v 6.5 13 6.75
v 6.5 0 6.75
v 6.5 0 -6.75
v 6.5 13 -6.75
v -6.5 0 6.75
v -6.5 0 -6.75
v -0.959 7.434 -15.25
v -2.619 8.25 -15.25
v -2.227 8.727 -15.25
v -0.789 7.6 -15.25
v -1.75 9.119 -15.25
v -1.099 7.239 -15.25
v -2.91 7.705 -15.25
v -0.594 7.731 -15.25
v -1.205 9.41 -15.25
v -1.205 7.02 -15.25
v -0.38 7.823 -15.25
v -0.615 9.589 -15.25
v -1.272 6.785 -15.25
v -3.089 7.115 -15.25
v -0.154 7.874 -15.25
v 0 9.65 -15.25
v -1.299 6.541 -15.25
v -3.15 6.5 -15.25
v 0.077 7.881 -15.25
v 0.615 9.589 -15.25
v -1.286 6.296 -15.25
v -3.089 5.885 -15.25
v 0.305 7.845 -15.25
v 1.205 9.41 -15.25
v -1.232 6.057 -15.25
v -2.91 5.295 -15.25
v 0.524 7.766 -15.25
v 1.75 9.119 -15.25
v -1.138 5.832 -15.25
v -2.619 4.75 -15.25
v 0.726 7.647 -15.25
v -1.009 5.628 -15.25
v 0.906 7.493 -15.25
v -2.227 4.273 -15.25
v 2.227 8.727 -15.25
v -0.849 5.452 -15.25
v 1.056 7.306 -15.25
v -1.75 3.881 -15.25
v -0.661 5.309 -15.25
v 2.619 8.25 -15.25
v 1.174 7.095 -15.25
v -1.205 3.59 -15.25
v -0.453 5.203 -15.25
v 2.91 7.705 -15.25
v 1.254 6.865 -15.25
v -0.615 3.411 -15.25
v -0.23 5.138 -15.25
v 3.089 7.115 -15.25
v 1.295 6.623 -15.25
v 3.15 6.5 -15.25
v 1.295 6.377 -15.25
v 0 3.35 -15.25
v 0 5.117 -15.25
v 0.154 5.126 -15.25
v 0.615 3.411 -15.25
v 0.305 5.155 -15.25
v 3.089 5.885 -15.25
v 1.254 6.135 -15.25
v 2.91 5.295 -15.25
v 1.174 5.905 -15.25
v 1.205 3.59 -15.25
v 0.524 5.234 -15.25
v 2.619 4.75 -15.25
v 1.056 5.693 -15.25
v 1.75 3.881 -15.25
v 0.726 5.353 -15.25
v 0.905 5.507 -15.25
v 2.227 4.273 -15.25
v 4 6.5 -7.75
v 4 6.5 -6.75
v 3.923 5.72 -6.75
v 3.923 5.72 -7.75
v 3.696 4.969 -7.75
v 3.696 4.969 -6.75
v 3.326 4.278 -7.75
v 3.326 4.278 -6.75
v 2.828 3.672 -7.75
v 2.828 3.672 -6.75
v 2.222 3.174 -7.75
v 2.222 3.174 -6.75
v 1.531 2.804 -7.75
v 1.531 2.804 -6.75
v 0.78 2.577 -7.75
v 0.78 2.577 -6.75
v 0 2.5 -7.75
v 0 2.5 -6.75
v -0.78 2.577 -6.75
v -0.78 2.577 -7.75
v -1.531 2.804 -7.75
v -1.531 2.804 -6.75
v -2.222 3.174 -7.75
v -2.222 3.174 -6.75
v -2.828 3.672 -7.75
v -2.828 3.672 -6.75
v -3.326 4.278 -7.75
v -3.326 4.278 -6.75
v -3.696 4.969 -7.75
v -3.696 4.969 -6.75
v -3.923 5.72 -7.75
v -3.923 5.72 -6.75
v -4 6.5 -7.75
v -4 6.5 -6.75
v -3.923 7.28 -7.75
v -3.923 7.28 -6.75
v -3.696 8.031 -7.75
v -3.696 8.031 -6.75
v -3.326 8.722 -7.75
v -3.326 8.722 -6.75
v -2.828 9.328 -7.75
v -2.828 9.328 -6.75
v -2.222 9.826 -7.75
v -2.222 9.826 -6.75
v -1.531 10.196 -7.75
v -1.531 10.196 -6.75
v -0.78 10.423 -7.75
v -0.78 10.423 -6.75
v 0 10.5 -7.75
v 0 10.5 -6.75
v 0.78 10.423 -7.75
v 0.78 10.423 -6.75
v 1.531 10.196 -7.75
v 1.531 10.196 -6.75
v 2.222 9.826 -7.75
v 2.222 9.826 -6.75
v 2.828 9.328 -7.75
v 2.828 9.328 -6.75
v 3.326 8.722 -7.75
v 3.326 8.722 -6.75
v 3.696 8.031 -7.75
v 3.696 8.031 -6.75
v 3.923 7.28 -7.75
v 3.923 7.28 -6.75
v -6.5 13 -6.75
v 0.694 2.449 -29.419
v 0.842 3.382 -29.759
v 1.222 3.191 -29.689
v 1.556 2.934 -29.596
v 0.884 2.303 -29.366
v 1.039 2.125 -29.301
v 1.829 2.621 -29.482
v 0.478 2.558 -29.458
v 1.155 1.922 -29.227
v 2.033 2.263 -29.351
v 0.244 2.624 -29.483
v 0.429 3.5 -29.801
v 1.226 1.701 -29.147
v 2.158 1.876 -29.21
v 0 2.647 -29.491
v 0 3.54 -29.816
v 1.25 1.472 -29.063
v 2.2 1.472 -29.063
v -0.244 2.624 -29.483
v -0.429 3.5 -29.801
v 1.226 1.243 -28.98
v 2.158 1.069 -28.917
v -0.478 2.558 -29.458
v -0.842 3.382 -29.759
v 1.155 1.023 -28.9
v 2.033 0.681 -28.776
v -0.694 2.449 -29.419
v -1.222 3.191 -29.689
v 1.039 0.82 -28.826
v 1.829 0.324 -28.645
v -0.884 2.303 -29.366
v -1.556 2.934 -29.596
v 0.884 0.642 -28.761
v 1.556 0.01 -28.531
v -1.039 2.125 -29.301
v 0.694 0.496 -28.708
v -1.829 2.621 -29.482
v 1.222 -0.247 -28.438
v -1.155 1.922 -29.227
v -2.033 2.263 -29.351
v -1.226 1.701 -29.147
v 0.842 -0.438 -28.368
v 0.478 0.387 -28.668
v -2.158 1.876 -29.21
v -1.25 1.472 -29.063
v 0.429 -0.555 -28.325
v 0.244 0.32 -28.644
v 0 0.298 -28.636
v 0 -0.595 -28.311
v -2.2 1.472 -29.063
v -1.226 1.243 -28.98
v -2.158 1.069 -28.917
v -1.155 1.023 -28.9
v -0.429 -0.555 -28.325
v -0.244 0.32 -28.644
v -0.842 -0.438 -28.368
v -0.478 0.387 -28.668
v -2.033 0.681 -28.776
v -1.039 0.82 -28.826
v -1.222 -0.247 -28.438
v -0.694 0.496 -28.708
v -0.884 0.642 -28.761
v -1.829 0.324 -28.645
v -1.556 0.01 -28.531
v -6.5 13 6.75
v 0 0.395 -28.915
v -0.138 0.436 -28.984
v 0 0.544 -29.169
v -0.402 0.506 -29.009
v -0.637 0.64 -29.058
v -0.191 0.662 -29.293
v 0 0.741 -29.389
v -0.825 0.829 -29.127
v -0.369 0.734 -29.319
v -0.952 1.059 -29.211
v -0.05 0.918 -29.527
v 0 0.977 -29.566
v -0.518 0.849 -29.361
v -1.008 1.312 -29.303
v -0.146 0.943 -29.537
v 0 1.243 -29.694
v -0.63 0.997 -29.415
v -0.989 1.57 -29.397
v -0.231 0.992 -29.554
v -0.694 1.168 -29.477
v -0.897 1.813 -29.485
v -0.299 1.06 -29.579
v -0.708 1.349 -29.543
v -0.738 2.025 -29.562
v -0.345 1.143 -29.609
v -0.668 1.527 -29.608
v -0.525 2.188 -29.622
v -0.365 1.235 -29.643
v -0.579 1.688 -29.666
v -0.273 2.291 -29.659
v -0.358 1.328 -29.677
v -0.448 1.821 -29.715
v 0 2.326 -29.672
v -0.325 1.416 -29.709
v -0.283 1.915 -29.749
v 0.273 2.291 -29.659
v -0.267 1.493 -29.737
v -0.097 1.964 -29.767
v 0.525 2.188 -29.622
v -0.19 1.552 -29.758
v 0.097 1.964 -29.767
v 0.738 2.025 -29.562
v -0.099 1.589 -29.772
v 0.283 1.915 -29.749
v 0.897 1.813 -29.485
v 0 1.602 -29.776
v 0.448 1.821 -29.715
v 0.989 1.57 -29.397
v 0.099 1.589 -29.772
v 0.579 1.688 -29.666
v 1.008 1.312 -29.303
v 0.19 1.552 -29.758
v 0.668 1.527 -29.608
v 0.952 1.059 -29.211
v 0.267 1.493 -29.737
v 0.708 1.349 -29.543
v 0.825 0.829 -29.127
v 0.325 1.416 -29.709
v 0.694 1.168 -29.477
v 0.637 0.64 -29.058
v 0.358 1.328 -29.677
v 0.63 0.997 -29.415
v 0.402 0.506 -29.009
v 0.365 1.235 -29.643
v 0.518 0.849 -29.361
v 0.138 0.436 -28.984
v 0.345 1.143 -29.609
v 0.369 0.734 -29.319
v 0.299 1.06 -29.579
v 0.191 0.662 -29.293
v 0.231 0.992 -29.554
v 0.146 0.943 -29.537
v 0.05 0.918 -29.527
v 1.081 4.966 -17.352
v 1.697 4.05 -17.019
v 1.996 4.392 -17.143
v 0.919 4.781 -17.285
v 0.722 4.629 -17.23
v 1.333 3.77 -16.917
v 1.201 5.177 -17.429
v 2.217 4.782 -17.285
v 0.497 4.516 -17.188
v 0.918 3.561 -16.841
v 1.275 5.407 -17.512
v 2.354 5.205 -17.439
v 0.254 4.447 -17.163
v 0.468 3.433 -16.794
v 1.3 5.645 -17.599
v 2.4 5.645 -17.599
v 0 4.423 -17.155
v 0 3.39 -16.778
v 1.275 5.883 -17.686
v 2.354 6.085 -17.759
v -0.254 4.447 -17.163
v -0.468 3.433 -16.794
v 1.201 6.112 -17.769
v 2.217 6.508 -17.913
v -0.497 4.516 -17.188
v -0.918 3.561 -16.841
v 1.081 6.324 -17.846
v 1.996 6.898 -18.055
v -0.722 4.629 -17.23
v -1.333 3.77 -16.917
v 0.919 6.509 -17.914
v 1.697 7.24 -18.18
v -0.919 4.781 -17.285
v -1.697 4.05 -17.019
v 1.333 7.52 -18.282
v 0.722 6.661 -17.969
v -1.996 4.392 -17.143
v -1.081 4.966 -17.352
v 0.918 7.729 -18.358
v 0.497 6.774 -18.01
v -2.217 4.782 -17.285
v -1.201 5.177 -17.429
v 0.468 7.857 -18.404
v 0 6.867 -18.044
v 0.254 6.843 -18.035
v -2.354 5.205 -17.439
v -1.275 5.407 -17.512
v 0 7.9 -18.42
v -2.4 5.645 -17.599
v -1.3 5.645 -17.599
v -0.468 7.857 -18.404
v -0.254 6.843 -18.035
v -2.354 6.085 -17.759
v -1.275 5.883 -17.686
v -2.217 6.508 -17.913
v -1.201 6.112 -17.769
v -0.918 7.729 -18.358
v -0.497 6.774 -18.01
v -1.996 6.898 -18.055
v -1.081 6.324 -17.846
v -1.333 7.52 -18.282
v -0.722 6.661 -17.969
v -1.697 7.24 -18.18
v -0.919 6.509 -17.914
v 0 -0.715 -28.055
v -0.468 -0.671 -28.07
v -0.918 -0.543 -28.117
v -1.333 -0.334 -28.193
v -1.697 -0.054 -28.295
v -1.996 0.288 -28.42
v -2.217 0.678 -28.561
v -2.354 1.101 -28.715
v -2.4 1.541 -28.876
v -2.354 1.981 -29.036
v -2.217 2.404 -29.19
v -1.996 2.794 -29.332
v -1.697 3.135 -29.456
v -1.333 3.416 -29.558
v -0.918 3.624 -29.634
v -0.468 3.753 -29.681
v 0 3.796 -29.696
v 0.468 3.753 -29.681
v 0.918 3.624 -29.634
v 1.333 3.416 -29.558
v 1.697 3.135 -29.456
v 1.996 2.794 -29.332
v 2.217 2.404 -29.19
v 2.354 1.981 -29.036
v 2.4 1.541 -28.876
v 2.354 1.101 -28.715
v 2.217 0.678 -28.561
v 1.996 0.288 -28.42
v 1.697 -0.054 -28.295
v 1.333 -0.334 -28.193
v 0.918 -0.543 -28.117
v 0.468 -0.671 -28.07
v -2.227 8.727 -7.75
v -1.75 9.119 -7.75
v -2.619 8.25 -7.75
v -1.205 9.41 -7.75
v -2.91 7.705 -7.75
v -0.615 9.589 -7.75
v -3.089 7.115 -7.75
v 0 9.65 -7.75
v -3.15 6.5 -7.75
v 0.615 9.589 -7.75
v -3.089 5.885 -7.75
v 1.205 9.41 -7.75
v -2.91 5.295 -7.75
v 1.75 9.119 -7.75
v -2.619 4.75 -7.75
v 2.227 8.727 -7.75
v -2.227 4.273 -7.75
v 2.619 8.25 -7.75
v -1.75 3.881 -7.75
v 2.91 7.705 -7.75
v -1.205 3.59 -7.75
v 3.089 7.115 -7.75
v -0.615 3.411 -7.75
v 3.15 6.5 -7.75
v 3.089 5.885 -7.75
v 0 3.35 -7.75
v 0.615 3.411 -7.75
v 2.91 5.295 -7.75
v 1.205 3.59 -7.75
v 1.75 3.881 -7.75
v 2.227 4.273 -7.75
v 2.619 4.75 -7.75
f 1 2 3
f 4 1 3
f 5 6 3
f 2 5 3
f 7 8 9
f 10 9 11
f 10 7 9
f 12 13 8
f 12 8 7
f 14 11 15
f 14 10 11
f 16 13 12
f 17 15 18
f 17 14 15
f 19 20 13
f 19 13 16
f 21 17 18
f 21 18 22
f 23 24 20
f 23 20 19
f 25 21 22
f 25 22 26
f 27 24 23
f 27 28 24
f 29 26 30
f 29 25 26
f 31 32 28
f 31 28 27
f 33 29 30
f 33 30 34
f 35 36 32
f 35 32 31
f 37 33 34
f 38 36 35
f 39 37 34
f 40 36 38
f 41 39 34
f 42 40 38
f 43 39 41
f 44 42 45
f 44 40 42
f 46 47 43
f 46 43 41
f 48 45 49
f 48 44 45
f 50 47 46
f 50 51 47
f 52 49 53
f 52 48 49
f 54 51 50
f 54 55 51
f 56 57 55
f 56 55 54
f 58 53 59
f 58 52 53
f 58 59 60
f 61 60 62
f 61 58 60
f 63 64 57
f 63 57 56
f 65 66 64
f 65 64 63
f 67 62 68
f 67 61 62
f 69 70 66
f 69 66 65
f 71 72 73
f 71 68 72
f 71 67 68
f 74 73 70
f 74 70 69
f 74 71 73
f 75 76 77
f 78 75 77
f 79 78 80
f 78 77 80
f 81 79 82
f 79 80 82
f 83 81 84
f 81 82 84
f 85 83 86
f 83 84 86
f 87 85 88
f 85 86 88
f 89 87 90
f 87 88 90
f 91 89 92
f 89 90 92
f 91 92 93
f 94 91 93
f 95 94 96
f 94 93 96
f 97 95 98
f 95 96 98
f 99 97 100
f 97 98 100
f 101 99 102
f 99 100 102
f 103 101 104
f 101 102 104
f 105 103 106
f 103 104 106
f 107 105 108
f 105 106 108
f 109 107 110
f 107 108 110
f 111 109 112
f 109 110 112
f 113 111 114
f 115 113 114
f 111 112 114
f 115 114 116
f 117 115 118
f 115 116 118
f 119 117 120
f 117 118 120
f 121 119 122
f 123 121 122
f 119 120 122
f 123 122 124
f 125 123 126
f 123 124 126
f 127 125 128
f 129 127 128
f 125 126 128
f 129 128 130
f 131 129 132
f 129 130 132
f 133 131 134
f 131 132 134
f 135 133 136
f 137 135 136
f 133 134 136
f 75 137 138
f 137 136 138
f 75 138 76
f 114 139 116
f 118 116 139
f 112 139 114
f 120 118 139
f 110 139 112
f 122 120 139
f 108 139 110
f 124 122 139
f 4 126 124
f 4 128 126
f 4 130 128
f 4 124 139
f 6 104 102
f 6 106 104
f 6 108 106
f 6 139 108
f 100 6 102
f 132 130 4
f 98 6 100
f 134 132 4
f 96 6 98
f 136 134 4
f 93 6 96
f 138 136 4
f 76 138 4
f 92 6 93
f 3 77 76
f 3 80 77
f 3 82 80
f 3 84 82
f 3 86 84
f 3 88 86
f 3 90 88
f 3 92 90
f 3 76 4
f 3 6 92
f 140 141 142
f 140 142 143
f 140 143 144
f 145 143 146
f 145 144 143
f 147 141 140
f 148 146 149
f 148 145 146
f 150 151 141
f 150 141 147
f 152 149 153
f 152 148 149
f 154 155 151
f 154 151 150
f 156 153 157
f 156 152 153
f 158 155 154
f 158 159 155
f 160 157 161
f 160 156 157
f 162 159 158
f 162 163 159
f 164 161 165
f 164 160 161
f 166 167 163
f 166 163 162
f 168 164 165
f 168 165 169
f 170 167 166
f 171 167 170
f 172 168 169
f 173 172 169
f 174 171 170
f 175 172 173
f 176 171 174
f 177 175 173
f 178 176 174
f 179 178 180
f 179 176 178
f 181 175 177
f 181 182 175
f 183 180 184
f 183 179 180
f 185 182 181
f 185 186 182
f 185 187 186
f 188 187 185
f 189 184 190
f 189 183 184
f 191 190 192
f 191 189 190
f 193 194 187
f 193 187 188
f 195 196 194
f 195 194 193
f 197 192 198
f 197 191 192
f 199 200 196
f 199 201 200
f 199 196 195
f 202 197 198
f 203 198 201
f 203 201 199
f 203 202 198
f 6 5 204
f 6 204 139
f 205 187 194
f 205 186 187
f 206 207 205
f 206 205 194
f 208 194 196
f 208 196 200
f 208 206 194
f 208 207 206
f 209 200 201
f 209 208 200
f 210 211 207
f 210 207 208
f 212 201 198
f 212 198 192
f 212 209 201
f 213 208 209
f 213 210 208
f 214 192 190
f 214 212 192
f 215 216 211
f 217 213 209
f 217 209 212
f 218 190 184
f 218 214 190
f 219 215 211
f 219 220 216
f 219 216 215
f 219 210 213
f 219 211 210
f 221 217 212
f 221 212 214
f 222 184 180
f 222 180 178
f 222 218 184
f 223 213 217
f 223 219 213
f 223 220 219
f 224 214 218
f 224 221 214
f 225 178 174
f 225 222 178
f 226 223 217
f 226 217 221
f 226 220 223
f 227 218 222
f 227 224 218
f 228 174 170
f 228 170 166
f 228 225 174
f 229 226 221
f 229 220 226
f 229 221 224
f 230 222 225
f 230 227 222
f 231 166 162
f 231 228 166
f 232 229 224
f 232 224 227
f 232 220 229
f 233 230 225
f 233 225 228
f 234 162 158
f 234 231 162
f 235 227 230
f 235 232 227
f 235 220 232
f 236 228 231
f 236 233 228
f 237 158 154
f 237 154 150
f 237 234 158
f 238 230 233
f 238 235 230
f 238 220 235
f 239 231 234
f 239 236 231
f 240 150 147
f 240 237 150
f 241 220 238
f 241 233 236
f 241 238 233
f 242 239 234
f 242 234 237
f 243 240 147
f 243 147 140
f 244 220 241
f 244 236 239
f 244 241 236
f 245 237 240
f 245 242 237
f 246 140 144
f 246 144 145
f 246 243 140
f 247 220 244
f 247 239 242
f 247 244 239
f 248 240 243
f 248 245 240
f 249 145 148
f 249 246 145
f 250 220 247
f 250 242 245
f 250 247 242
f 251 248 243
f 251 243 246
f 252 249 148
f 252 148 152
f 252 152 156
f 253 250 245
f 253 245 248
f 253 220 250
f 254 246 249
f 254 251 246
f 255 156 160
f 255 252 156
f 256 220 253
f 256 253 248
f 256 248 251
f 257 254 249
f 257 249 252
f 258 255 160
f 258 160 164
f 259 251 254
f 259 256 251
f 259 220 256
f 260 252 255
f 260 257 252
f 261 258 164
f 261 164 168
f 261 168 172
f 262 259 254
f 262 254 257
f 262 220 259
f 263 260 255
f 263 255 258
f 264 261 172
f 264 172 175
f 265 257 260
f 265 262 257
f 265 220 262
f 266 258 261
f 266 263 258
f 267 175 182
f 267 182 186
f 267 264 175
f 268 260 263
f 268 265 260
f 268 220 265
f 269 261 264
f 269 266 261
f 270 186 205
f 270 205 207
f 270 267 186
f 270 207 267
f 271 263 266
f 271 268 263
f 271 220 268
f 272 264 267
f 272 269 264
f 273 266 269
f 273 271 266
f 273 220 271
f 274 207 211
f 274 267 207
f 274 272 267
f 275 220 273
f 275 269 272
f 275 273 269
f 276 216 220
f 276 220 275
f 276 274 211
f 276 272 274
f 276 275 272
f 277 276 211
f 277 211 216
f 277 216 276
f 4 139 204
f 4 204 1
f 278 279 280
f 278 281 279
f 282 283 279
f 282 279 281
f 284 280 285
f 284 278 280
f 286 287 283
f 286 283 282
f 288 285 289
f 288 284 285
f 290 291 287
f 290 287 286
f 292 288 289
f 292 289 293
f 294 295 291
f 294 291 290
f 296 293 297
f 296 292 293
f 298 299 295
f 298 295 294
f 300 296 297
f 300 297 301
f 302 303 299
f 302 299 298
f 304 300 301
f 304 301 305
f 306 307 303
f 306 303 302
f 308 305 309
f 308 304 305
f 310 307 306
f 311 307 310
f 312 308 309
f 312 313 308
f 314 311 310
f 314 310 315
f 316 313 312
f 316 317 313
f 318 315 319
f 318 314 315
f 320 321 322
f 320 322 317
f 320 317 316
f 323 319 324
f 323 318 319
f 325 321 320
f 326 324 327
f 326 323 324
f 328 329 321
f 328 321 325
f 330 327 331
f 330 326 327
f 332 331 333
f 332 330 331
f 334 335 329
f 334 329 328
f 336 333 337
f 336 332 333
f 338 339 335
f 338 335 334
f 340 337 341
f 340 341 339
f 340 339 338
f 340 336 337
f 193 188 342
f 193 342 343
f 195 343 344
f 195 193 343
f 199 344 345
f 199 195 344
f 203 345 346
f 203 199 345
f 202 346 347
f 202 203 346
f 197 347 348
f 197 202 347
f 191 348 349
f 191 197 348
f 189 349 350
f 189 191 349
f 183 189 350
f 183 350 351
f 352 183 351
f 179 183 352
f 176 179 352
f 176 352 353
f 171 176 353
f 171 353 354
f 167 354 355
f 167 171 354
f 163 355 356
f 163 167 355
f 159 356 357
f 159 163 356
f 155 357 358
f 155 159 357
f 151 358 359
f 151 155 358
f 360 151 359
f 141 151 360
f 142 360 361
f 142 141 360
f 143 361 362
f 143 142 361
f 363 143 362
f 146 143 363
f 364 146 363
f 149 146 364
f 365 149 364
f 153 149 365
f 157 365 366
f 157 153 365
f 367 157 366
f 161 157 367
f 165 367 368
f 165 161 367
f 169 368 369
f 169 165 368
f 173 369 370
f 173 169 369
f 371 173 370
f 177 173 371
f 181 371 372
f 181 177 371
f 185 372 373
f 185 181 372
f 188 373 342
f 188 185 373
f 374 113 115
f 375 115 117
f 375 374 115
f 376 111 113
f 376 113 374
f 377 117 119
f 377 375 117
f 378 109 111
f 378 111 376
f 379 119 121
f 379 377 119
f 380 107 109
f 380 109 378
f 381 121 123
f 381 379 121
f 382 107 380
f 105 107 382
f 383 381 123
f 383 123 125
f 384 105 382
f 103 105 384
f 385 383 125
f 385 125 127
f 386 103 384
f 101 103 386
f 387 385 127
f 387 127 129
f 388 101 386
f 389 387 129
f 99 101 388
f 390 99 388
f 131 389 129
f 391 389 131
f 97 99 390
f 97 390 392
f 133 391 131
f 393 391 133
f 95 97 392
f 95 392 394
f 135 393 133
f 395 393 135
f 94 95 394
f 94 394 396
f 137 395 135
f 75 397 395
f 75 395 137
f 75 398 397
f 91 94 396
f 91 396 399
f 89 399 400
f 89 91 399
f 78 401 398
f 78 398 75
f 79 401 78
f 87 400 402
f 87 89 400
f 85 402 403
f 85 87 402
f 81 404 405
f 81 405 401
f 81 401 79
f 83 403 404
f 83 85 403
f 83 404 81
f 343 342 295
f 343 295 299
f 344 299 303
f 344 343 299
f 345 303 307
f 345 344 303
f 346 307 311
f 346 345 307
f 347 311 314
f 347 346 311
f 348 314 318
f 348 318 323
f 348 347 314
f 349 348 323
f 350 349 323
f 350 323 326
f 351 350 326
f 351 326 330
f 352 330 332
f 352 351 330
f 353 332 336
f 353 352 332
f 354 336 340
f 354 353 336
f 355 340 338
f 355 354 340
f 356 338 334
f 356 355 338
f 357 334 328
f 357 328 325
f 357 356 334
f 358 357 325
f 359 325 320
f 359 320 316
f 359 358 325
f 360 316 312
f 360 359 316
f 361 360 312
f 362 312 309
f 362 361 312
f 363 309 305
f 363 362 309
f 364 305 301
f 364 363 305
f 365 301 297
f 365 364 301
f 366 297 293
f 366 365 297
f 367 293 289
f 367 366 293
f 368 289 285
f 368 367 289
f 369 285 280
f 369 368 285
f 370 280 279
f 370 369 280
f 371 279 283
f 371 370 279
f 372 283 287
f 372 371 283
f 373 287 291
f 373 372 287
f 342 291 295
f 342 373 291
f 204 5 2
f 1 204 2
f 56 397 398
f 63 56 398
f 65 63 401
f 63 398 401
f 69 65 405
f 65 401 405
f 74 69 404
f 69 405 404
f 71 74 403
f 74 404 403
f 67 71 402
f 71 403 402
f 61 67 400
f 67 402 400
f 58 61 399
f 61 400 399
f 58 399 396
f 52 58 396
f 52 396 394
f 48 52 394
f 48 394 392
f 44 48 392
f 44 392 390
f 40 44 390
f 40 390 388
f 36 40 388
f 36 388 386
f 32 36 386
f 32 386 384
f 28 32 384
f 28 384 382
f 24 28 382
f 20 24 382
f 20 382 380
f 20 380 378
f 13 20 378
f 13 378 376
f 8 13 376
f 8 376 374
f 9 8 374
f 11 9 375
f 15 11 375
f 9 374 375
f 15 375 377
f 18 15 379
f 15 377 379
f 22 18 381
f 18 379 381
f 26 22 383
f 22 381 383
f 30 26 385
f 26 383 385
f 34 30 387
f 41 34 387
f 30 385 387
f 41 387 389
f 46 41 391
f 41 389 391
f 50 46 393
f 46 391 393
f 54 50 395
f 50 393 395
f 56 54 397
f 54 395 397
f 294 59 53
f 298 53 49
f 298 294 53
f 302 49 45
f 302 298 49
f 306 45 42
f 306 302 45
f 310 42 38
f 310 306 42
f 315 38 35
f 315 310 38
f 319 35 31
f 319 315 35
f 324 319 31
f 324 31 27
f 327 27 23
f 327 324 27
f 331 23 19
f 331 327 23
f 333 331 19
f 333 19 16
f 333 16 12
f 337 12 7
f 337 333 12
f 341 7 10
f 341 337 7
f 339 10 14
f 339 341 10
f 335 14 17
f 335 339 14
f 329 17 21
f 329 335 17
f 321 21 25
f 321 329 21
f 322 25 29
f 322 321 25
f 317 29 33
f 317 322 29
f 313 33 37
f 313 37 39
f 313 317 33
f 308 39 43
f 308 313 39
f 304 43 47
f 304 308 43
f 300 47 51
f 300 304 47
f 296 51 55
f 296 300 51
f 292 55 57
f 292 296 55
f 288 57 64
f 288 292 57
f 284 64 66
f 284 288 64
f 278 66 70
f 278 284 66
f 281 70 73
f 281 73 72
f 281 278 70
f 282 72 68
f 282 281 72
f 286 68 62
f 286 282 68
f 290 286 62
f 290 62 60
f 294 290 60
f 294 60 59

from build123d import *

# Parameters (mm, degrees)
SKETCH1_W           = 13
SKETCH1_H           = 13.5
BOSS_EXTRUDE1_DEPTH = 13
SKETCH2_R           = 3.15
BOSS_EXTRUDE2_DEPTH = 8.5
SKETCH3_R           = 4
BOSS_EXTRUDE3_DEPTH = 1
CHAMFER1_SIZE       = 0.2


with BuildPart() as part:
    # Sketch1 → Boss-Extrude1 (new body)
    with BuildSketch(Plane(origin=(0, 0, 0), x_dir=(1, 0, 0), z_dir=(0, 1, 0))):
        Rectangle(SKETCH1_W, SKETCH1_H)
    extrude(amount=BOSS_EXTRUDE1_DEPTH)

    # Sketch2 → Boss-Extrude2 (add)
    with BuildSketch(Plane(origin=(0, 0, -6.75), x_dir=(-1, 0, 0), z_dir=(0, 0, -1))):
        with Locations(Location((0, 6.5, 0), (0, 0, 180))):
            Circle(SKETCH2_R)
    extrude(amount=BOSS_EXTRUDE2_DEPTH)

    # Sketch3 → Boss-Extrude3 (add)
    with BuildSketch(Plane(origin=(0, 0, -6.75), x_dir=(-1, 0, 0), z_dir=(0, 0, -1))):
        with Locations(Location((0, 6.5, 0), (0, 0, 180))):
            Circle(SKETCH3_R)
    extrude(amount=BOSS_EXTRUDE3_DEPTH)

    # Sketch4 → Revolve1 (revolve)
    with BuildSketch(Plane(origin=(0, 0, 0), x_dir=(0, 0, -1), z_dir=(1, 0, 0))):
        with BuildLine():
            Line((14.310307379, 6.842020143), (13.865681193, 5.620419736))
            Line((13.865681193, 5.620419736), (17.154605366, 4.423349235))
            Line((17.154605366, 4.423349235), (16.778383208, 3.389687352))
            Line((16.778383208, 3.389687352), (28.242633182, -0.782958397))
            Line((28.242633182, -0.782958397), (28.635956346, 0.297688117))
            ThreePointArc((28.635956346, 0.297688117), (29.283711619, 0.637305625), (29.693868496, 1.2428618))
            Line((29.693868496, 1.2428618), (14.310307379, 6.842020143))
        make_face()
    revolve(axis=Axis((0, 6.5, -15.25), (0, -0.34202014332566943, -0.9396926207859081)))

    # Chamfer1
    chamfer1_edges = [part.edges().sort_by_distance(p)[0] for p in [
        (0, 3.727566183, -29.88432987),
    ]]
    chamfer(chamfer1_edges, length=CHAMFER1_SIZE)


solid = part.part
